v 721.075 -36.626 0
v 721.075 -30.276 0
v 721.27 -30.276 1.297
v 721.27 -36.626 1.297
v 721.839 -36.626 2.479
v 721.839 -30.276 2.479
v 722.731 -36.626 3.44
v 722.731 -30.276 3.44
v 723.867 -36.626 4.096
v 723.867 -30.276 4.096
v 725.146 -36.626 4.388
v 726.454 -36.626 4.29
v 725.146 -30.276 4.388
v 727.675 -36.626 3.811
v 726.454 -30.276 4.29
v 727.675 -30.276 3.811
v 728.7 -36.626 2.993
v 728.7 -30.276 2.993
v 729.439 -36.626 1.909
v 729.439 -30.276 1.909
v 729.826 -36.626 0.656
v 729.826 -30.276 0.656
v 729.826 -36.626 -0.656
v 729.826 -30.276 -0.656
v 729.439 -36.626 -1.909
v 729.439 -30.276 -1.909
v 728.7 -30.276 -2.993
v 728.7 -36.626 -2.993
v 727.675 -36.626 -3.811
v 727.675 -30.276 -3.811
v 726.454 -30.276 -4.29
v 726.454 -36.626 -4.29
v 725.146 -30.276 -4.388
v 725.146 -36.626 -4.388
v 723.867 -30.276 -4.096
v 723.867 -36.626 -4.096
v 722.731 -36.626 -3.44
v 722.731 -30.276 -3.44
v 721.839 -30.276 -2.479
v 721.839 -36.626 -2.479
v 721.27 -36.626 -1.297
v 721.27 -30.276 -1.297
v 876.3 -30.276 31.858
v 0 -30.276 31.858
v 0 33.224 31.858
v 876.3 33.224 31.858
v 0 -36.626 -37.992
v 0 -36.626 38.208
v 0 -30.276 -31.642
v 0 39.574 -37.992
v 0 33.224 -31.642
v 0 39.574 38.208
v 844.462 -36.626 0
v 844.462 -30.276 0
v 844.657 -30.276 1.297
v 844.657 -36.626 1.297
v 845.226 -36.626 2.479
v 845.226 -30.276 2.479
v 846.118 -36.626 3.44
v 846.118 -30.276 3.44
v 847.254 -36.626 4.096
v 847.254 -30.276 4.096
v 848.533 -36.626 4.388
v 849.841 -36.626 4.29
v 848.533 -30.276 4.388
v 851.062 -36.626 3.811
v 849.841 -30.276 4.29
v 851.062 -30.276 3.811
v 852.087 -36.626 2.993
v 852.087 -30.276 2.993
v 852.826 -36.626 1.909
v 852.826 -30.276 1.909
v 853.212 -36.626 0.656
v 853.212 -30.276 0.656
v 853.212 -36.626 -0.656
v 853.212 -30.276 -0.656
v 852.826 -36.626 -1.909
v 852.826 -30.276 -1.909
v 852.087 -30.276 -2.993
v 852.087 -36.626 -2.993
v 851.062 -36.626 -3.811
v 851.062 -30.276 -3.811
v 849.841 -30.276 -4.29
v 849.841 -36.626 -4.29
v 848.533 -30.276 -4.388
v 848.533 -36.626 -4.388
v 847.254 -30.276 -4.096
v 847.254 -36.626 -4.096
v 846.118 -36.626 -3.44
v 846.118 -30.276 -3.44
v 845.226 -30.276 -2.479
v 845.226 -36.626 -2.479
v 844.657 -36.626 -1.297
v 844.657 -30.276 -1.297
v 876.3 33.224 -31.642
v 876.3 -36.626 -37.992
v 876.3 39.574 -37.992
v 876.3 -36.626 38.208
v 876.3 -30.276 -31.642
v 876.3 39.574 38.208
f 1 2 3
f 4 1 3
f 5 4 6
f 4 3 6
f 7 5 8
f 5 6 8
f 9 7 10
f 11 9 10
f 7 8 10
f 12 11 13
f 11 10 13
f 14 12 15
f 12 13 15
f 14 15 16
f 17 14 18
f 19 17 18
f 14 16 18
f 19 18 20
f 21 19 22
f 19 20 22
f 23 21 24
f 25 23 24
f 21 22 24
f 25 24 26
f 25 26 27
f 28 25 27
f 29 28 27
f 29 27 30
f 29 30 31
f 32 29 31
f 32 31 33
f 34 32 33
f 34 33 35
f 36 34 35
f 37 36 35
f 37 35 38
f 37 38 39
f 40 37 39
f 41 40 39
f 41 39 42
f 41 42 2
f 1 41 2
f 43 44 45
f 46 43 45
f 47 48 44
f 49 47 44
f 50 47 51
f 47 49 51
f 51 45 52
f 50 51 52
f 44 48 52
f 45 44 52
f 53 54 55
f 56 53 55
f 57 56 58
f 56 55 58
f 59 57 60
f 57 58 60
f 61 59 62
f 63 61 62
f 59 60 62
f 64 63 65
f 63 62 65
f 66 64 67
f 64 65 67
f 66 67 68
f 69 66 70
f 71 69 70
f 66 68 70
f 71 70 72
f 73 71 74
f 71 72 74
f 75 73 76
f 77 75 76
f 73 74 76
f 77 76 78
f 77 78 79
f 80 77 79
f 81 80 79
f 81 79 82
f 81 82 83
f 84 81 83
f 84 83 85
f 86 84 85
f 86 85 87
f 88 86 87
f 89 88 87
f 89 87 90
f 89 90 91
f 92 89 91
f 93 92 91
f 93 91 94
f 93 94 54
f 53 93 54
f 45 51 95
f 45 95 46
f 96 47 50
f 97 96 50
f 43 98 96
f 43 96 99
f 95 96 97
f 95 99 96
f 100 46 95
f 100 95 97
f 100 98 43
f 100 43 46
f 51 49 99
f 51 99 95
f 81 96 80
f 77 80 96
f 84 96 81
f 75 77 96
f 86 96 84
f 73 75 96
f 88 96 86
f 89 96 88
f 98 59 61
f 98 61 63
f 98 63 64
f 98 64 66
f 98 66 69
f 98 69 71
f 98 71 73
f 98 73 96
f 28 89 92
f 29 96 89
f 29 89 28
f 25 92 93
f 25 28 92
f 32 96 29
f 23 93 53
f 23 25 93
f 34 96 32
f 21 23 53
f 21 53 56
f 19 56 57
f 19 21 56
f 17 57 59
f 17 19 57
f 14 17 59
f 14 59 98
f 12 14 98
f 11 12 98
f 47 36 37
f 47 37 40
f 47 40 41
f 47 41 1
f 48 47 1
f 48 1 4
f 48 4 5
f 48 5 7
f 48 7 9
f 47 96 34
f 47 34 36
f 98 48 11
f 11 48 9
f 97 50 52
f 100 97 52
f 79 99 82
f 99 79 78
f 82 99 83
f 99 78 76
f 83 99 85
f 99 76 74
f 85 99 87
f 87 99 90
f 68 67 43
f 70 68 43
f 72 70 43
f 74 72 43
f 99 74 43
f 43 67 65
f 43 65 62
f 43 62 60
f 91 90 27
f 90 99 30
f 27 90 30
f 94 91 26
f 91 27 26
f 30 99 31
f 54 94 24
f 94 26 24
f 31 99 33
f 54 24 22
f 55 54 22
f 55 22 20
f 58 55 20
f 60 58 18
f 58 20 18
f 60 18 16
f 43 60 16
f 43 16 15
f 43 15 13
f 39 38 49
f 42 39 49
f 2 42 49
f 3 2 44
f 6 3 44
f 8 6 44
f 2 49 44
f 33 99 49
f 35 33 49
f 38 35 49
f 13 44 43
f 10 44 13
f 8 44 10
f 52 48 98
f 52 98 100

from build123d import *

# Parameters (mm, degrees)
F0_W     = 76.2
F0_H     = 76.2
F0_W_2   = 63.5
F0_H_2   = 63.5
F1_DEPTH = 876.3
F4_D     = 8.8
F4_DEPTH = 29.15
F4_TIP   = 2.6437867237


with BuildPart() as f1:
    # F0 (on Right) → F1 (new body)
    with BuildSketch(Plane.YZ):
        with Locations((1.4744321764, 0.1075561106)):
            Rectangle(F0_W, F0_H)
        with Locations((1.4744321764, 0.1075561106)):
            Rectangle(F0_W_2, F0_H_2, mode=Mode.SUBTRACT)
    extrude(amount=F1_DEPTH)

    # F4
    with Locations(Plane.XZ.offset(36.6255678236)):
        with Locations((848.8616235588, 0), (725.4748, 0)):
            Hole(F4_D / 2, depth=F4_DEPTH)
            with Locations((0, 0, -(F4_DEPTH + F4_TIP / 2))):  # 118° drill point
                Cone(0, F4_D / 2, F4_TIP, mode=Mode.SUBTRACT)


solid = f1.part
